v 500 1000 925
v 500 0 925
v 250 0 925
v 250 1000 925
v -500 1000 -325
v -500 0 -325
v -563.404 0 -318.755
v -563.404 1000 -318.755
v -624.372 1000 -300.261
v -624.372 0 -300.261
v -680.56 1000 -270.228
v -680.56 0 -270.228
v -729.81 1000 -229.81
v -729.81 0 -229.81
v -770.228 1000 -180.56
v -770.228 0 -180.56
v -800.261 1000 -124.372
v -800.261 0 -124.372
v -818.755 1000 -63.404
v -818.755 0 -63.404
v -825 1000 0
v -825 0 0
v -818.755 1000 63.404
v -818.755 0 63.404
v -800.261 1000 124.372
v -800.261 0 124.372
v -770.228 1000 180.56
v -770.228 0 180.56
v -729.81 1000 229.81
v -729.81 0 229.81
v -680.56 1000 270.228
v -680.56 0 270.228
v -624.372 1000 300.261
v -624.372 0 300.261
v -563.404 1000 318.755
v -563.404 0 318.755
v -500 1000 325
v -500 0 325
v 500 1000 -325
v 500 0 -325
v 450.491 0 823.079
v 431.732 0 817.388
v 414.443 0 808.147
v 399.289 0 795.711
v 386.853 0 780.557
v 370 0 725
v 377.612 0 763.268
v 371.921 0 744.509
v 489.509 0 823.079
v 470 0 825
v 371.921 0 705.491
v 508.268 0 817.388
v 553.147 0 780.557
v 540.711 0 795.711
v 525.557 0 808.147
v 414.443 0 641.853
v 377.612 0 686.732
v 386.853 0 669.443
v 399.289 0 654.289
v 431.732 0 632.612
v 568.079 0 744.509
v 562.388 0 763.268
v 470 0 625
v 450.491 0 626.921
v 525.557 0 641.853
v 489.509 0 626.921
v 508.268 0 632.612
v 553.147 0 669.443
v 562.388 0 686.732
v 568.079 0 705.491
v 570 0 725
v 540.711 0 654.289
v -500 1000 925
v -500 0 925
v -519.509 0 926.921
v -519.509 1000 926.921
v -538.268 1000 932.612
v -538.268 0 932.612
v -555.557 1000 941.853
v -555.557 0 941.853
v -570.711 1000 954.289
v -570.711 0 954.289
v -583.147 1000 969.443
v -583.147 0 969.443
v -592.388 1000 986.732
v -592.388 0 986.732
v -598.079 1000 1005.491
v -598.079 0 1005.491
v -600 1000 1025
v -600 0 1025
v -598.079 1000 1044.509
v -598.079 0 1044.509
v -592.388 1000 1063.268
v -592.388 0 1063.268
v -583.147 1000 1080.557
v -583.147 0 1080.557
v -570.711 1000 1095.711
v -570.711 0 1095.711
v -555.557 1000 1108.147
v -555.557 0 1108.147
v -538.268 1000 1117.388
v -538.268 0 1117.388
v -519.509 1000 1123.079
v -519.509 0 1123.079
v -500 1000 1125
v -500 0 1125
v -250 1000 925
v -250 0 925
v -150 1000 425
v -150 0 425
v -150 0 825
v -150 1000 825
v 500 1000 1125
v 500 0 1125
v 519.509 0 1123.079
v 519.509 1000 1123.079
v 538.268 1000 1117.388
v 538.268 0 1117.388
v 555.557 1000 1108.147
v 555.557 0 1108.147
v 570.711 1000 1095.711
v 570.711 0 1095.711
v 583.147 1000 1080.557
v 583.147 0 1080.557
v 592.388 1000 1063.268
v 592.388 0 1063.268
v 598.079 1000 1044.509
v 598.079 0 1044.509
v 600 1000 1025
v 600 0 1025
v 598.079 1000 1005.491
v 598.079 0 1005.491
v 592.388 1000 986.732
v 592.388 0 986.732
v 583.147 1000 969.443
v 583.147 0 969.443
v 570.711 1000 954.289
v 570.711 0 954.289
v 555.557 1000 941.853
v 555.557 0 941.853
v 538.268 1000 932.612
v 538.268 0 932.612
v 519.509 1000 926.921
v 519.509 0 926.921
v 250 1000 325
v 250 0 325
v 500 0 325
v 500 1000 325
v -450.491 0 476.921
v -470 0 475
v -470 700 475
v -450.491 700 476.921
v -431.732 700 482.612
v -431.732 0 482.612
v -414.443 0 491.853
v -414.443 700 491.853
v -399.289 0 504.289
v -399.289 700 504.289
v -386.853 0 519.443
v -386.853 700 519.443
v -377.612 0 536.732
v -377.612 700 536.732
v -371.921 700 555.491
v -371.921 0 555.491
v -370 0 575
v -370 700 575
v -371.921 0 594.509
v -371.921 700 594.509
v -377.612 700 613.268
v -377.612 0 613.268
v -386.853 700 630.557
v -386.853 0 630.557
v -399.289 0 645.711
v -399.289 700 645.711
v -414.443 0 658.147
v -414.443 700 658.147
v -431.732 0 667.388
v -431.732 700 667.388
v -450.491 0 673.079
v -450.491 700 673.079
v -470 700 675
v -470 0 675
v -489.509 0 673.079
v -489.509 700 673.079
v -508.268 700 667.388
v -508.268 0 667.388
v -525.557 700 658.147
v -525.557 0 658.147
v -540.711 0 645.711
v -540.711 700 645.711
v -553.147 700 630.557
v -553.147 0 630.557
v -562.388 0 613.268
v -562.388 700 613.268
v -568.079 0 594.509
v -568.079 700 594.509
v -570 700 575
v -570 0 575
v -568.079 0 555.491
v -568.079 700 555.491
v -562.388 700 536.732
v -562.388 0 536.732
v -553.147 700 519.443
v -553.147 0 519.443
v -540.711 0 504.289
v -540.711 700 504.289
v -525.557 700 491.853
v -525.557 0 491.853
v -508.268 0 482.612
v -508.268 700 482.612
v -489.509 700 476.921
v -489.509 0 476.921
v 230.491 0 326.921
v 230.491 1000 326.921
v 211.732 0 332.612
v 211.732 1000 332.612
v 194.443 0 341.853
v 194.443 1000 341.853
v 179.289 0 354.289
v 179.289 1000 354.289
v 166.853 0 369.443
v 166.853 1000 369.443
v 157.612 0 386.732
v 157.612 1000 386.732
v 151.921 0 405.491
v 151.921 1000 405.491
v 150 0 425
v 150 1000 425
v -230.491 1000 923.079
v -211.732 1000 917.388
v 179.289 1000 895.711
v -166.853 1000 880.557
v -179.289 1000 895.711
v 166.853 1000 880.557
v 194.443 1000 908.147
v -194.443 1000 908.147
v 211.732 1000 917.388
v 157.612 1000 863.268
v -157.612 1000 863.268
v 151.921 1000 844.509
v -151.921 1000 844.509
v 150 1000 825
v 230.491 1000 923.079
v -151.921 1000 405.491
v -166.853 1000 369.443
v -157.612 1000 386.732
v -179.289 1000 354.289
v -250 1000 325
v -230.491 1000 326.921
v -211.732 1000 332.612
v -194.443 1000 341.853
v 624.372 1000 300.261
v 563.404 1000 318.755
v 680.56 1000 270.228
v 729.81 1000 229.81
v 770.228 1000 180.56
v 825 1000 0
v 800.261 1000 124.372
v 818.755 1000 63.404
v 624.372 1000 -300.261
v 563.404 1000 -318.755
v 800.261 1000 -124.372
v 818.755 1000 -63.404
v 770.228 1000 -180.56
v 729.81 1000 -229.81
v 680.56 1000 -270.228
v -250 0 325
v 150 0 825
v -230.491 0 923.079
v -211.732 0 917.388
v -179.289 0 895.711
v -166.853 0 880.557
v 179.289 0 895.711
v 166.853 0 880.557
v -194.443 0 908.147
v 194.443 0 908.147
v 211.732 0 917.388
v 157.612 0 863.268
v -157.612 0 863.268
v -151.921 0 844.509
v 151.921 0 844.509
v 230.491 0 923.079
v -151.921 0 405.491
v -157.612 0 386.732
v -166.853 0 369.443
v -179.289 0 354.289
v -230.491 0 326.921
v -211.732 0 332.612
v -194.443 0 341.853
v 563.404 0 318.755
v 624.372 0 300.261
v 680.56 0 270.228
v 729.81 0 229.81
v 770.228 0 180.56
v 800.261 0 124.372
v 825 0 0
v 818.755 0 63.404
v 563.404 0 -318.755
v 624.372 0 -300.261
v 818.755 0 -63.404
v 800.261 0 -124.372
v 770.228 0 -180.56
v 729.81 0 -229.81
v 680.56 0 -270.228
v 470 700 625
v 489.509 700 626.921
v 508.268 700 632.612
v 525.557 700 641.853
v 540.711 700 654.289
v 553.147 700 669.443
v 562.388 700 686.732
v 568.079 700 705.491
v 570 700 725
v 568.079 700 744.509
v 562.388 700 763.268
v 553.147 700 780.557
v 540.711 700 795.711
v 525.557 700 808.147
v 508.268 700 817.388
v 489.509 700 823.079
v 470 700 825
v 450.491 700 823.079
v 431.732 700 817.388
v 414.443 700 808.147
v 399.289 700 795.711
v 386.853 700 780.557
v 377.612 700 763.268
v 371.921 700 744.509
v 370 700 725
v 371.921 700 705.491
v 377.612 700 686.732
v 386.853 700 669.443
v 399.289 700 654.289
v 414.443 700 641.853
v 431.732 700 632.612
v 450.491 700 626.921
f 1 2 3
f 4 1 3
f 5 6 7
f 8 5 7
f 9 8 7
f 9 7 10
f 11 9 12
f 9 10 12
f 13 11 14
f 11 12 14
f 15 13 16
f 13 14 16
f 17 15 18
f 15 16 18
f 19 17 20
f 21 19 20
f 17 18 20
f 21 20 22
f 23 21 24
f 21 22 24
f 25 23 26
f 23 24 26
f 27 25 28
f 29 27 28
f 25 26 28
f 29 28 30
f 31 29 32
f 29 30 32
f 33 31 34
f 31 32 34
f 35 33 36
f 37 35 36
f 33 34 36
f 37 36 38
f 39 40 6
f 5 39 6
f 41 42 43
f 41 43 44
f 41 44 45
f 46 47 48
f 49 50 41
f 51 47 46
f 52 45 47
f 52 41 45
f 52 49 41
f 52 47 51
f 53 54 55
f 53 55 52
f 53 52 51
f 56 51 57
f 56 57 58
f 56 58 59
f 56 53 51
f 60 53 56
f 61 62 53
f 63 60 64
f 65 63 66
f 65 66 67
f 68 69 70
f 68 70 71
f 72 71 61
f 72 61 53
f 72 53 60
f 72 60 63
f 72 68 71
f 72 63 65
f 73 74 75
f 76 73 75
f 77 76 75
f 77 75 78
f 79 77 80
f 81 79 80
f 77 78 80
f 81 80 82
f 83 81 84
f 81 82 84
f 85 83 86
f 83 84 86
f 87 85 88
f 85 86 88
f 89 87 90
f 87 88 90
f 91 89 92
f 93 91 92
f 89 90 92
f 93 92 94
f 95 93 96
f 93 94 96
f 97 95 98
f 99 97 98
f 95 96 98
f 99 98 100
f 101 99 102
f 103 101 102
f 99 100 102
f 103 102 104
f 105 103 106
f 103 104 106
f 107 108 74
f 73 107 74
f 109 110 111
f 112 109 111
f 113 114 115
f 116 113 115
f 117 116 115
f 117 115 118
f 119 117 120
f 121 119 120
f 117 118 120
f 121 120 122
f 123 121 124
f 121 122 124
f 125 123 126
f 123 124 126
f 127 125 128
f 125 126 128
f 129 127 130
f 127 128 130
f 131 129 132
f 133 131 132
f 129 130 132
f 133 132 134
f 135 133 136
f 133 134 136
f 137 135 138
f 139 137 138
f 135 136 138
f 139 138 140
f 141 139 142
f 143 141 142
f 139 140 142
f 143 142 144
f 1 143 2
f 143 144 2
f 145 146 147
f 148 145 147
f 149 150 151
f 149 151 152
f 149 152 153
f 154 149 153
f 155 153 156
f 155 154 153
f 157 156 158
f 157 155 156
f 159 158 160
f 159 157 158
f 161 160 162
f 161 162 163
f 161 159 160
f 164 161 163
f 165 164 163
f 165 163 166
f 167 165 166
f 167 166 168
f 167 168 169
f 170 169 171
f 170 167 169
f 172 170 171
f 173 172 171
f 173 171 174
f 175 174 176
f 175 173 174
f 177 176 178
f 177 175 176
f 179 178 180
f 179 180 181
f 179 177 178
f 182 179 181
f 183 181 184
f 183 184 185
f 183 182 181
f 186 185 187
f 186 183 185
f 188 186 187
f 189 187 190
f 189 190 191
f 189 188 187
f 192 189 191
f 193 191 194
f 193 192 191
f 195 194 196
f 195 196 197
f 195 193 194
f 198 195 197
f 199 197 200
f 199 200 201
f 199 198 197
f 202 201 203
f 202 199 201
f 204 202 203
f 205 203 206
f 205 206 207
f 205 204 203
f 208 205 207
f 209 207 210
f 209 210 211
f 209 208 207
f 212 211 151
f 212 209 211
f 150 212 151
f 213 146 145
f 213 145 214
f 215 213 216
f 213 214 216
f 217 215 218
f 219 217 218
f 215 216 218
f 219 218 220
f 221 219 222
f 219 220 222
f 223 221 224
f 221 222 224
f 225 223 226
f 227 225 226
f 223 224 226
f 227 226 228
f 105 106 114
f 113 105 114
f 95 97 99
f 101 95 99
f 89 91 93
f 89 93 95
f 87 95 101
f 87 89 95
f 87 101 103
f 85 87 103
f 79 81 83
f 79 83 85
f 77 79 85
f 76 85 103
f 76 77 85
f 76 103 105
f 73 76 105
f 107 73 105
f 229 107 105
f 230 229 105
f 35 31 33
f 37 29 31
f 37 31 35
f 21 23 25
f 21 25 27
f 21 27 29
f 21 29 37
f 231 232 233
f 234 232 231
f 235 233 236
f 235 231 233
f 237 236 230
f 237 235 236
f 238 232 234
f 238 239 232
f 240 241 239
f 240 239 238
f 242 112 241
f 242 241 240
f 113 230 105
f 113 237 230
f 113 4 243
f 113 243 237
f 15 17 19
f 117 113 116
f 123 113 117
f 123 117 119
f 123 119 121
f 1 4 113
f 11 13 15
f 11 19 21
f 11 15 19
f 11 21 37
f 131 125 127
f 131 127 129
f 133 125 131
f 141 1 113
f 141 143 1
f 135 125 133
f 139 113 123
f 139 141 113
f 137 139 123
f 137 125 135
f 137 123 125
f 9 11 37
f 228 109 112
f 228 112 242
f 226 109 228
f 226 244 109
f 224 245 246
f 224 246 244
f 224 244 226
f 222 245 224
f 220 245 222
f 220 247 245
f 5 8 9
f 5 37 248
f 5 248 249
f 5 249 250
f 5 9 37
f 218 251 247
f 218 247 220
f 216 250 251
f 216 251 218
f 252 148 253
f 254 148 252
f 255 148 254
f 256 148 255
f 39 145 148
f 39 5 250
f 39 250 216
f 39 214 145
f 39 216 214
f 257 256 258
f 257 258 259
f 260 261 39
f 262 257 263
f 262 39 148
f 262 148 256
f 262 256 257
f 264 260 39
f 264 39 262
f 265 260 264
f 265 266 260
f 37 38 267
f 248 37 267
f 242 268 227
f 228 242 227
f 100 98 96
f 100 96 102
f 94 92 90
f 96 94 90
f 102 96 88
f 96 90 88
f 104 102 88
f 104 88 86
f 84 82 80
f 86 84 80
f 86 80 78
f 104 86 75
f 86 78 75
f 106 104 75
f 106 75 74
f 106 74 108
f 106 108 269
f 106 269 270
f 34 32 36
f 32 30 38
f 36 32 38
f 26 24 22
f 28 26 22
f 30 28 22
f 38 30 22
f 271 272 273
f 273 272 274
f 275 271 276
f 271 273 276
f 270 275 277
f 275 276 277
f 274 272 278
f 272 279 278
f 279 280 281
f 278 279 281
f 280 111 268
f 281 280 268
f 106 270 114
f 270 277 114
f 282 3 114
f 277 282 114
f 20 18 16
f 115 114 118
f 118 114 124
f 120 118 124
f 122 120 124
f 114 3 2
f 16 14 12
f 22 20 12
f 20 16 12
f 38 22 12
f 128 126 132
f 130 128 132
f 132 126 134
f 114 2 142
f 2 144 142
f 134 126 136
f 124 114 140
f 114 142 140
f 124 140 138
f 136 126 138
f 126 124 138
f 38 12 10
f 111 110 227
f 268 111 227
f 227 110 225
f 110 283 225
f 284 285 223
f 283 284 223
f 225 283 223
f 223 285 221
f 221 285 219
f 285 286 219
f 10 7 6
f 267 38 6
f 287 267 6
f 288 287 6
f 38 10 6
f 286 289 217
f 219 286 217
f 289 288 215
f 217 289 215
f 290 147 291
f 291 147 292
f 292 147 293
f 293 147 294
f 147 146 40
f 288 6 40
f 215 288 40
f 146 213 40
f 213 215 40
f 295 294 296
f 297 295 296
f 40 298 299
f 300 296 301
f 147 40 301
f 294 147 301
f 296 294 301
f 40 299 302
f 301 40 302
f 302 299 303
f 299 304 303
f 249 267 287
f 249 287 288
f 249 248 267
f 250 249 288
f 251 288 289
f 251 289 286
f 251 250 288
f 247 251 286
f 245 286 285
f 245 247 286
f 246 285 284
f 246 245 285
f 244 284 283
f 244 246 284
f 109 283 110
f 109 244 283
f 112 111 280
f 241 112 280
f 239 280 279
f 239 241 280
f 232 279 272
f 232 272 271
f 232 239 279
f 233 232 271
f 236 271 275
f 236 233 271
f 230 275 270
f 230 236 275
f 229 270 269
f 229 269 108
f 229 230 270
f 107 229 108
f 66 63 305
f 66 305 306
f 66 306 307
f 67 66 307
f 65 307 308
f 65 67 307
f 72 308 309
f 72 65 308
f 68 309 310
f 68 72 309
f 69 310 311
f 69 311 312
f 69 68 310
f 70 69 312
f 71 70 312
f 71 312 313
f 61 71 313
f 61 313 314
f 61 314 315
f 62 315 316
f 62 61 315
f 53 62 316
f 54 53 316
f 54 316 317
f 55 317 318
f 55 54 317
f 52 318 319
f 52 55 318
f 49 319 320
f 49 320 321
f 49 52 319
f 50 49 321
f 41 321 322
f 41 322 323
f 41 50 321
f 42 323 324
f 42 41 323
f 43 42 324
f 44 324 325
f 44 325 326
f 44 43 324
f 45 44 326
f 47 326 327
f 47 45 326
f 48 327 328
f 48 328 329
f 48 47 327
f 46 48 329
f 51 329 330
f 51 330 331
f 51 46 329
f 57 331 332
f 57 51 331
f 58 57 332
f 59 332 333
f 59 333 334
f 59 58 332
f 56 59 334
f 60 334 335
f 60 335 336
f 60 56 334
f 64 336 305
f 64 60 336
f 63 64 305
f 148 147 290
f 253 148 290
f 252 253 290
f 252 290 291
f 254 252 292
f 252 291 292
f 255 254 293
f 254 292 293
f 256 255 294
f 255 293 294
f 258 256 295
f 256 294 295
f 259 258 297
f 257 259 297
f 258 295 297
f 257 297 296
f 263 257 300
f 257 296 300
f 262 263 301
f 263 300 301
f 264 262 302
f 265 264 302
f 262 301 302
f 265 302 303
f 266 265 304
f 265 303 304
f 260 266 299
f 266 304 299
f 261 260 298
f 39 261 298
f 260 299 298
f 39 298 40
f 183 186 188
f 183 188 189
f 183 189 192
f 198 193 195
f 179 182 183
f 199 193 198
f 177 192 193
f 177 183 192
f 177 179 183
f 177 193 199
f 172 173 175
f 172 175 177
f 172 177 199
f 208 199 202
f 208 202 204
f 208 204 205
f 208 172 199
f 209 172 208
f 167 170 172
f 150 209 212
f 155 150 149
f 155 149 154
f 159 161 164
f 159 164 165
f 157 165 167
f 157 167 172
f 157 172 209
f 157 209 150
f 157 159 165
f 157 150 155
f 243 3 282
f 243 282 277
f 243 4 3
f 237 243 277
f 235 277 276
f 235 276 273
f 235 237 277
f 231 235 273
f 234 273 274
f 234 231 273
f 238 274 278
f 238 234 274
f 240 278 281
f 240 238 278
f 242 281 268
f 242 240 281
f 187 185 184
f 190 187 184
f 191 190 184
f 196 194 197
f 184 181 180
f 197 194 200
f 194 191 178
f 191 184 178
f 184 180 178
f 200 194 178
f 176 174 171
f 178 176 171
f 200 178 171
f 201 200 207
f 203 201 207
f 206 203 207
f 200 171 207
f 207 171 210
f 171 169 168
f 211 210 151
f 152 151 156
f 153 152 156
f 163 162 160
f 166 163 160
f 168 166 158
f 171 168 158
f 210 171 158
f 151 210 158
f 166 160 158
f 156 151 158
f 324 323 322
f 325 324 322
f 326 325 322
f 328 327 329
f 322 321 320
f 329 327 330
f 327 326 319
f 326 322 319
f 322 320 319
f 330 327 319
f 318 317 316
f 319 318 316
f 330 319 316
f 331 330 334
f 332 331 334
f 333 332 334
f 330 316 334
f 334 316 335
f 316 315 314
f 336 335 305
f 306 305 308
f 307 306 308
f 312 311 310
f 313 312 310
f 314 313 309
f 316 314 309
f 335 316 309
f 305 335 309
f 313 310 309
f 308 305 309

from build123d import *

# Parameters (mm, degrees)
BOSS_EXTRUDE1_DEPTH   = 1000
FILLET1_R             = 100
SKETCH2_R             = 100
BOSS_EXTRUDE2_DEPTH   = 700
BOSS_EXTRUDE2_2_DEPTH = 700


with BuildPart() as part:
    # Sketch1 → Boss-Extrude1 (new body)
    with BuildSketch(Plane(origin=(0, 0, 0), x_dir=(1, 0, 0), z_dir=(0, 1, 0))):
        with BuildLine():
            Line((150, -325), (500, -325))
            ThreePointArc((500, -325), (825, 0), (500, 325))
            Line((500, 325), (-500, 325))
            ThreePointArc((-500, 325), (-825, 0), (-500, -325))
            Line((-500, -325), (-150, -325))
            Line((-150, -325), (-150, -925))
            Line((-150, -925), (-500, -925))
            ThreePointArc((-500, -925), (-600, -1025), (-500, -1125))
            Line((-500, -1125), (500, -1125))
            ThreePointArc((500, -1125), (600, -1025), (500, -925))
            Line((500, -925), (150, -925))
            Line((150, -925), (150, -325))
        make_face()
    extrude(amount=BOSS_EXTRUDE1_DEPTH)

    # Fillet1
    fillet1_edges = [part.edges().sort_by_distance(p)[0] for p in [
        (150, 500, 325),
        (150, 500, 925),
        (-150, 500, 925),
        (-150, 500, 325),
    ]]
    fillet(fillet1_edges, radius=FILLET1_R)


with BuildPart() as body_2:
    # Sketch2 → Boss-Extrude2 (new body)
    with BuildSketch(Plane.XZ):
        with Locations(Location((470, 725, 0), (0, 0, 270))):
            Circle(SKETCH2_R)
    extrude(amount=-BOSS_EXTRUDE2_DEPTH)


with BuildPart() as body_3:
    # Sketch2 → Boss-Extrude2 2 (new body)
    with BuildSketch(Plane.XZ):
        with Locations(Location((-470, 575, 0), (0, 0, 270))):
            Circle(SKETCH2_R)
    extrude(amount=-BOSS_EXTRUDE2_2_DEPTH)


solid = Compound([part.part, body_2.part, body_3.part])
